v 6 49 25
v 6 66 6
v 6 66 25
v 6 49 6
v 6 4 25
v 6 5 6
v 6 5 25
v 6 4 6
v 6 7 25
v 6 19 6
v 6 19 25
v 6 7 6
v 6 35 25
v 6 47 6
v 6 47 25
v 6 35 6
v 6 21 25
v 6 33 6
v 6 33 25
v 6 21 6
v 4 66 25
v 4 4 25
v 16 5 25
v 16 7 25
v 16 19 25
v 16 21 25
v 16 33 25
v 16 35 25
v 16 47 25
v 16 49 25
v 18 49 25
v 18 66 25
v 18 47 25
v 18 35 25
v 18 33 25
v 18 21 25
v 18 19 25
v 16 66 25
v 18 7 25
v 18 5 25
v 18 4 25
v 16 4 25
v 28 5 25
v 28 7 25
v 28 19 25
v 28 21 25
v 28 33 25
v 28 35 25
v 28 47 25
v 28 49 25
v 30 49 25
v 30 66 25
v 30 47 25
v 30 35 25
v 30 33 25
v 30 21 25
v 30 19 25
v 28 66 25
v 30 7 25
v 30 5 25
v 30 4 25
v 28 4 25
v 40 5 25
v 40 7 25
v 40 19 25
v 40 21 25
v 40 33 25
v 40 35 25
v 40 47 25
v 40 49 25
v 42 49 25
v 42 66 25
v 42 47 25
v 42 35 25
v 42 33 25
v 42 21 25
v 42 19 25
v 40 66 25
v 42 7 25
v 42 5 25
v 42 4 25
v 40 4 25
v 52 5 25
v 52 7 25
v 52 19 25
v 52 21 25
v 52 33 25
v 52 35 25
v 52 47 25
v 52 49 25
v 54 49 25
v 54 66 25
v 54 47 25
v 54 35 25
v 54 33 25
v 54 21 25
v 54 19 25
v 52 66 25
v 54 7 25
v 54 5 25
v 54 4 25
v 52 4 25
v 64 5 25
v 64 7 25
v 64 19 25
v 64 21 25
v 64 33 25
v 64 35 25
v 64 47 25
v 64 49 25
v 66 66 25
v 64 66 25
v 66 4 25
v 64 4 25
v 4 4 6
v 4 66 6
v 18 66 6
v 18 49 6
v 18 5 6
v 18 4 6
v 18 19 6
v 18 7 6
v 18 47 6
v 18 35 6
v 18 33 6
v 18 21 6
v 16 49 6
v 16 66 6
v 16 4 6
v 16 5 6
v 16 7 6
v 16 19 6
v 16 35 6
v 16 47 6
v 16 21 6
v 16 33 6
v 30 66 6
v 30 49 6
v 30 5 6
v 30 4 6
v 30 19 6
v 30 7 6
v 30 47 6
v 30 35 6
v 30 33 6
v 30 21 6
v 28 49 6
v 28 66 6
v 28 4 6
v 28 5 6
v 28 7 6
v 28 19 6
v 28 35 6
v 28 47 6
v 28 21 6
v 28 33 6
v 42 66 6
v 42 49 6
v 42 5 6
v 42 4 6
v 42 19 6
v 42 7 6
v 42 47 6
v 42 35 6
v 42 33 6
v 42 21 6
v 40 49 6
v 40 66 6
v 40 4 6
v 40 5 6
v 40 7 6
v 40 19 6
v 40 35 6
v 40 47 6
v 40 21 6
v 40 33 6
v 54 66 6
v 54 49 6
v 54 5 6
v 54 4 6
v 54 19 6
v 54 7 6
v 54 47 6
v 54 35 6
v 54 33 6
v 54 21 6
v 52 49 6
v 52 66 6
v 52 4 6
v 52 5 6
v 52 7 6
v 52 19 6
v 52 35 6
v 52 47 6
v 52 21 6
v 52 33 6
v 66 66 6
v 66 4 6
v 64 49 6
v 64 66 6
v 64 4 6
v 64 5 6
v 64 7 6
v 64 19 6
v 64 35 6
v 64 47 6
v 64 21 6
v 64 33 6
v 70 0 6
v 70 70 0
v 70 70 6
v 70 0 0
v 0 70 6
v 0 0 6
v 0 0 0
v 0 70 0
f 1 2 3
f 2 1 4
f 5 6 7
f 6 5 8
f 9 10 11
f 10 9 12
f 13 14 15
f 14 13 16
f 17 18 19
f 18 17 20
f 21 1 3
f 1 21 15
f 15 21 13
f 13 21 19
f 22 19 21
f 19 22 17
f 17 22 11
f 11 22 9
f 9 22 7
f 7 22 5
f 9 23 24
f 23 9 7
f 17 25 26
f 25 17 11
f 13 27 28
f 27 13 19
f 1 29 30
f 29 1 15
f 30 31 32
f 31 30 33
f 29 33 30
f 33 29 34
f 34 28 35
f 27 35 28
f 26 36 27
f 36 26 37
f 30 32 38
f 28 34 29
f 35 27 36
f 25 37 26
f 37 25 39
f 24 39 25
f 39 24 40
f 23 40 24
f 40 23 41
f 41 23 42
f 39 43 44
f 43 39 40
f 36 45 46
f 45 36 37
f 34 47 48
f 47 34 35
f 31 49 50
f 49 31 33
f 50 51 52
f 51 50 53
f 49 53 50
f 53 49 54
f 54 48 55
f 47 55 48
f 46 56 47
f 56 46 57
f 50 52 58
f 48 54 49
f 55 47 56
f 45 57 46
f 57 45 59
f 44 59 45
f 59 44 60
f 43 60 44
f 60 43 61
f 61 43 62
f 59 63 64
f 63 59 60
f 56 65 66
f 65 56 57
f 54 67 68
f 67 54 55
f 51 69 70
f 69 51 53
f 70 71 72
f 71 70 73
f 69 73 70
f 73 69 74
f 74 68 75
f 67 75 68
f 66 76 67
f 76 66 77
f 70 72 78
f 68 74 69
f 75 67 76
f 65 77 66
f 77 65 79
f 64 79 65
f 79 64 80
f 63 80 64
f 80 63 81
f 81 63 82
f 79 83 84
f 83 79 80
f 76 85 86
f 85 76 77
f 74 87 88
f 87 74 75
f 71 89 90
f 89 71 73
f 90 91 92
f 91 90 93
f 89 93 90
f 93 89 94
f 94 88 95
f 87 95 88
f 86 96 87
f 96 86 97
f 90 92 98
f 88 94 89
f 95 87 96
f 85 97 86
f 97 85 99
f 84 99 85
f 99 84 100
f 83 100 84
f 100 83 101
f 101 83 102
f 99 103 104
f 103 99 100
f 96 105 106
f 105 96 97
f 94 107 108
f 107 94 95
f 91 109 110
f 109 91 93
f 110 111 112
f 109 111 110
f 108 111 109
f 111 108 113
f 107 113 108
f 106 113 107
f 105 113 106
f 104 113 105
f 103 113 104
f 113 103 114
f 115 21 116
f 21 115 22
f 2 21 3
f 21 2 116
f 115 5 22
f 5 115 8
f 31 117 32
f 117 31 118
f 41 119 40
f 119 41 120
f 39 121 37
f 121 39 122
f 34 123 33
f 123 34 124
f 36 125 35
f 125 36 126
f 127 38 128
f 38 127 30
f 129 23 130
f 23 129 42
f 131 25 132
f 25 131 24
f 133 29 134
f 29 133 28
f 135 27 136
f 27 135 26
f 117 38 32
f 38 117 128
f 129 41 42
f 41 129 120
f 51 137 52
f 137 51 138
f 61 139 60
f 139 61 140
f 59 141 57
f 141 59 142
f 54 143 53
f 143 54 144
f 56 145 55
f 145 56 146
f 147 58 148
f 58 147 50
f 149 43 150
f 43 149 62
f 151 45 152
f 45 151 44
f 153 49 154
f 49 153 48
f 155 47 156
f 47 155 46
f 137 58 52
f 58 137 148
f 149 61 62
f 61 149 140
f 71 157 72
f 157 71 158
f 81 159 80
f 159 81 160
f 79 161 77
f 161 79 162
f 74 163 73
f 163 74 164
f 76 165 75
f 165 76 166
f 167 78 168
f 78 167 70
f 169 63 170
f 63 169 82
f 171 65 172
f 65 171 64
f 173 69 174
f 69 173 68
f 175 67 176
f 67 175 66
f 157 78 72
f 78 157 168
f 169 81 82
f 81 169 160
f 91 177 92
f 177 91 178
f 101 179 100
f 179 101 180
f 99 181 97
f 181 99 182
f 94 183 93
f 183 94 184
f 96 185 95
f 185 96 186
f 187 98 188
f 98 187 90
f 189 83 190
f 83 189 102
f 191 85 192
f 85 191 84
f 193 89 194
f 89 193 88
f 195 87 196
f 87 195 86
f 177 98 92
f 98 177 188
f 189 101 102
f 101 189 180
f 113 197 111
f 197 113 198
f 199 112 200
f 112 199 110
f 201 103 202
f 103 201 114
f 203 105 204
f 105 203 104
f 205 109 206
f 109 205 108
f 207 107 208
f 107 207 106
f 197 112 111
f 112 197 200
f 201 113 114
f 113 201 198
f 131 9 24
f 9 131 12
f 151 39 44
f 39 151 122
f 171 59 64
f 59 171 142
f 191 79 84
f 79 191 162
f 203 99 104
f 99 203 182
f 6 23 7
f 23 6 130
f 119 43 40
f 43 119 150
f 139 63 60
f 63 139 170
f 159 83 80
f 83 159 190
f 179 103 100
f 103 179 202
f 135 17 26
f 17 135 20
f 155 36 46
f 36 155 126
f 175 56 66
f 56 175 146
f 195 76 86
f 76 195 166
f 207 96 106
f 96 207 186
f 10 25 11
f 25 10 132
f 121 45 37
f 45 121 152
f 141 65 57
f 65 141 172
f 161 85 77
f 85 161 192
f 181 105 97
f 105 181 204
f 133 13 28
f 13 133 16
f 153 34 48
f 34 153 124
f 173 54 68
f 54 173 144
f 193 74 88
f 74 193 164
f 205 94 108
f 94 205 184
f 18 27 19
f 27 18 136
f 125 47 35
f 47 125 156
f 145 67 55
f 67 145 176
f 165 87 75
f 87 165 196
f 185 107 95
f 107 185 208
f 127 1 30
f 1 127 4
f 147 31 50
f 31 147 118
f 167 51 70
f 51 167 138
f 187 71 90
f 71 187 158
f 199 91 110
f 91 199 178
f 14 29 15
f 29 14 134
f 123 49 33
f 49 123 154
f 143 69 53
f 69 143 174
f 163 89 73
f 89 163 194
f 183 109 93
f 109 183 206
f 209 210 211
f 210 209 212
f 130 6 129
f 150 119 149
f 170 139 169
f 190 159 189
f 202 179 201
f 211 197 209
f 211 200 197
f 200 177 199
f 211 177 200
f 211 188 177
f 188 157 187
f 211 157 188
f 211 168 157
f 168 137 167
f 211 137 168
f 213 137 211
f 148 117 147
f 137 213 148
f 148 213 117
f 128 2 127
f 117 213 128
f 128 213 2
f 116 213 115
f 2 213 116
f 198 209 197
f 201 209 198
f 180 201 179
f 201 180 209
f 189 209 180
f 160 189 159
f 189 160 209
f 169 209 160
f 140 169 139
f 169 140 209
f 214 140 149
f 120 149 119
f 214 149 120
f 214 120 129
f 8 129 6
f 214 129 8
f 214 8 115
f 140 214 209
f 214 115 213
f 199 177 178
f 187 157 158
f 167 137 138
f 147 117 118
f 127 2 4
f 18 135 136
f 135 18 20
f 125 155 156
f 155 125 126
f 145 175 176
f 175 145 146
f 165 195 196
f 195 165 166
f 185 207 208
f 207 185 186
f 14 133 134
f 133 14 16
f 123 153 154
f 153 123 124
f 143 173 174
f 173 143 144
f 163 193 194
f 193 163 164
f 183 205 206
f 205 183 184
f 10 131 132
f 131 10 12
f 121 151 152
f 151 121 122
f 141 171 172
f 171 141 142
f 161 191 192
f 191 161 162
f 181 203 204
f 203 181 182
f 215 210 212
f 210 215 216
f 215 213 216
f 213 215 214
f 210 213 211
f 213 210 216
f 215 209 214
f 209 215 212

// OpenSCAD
$fn = 32;

// ----------------------------------------------------------------------
// Heatsink: cross fin block
// ----------------------------------------------------------------------

// --- parameters (mm) ---
base_l = 70;              // base length, X
base_w = 70;              // base width, Y
base_t = 6;               // base plate thickness
fin_h = 20;               // fin height above the base
fin_t = 2;                // fin thickness
edge = 4;                 // margin from the base ends
pitch = 12;               // fin pitch
rib_pitch = 14;           // cross rib pitch

n_fins = floor((base_l - 2 * edge - fin_t) / pitch) + 1;  // fin count
total_h = base_t + fin_h - 1;  // overall height
n_ribs = floor((base_w - 2 * edge) / rib_pitch);  // rib count

union() {
  cube([base_l, base_w, base_t]);
  for (i = [0 : n_fins - 1])
    translate([edge + i * pitch, edge, base_t - 1])
      cube([fin_t, base_w - 2 * edge, fin_h]);
  for (i = [0 : n_ribs - 1])
    translate([edge, edge + 1 + i * rib_pitch, base_t - 1])
      cube([base_l - 2 * edge, fin_t, fin_h]);
}
